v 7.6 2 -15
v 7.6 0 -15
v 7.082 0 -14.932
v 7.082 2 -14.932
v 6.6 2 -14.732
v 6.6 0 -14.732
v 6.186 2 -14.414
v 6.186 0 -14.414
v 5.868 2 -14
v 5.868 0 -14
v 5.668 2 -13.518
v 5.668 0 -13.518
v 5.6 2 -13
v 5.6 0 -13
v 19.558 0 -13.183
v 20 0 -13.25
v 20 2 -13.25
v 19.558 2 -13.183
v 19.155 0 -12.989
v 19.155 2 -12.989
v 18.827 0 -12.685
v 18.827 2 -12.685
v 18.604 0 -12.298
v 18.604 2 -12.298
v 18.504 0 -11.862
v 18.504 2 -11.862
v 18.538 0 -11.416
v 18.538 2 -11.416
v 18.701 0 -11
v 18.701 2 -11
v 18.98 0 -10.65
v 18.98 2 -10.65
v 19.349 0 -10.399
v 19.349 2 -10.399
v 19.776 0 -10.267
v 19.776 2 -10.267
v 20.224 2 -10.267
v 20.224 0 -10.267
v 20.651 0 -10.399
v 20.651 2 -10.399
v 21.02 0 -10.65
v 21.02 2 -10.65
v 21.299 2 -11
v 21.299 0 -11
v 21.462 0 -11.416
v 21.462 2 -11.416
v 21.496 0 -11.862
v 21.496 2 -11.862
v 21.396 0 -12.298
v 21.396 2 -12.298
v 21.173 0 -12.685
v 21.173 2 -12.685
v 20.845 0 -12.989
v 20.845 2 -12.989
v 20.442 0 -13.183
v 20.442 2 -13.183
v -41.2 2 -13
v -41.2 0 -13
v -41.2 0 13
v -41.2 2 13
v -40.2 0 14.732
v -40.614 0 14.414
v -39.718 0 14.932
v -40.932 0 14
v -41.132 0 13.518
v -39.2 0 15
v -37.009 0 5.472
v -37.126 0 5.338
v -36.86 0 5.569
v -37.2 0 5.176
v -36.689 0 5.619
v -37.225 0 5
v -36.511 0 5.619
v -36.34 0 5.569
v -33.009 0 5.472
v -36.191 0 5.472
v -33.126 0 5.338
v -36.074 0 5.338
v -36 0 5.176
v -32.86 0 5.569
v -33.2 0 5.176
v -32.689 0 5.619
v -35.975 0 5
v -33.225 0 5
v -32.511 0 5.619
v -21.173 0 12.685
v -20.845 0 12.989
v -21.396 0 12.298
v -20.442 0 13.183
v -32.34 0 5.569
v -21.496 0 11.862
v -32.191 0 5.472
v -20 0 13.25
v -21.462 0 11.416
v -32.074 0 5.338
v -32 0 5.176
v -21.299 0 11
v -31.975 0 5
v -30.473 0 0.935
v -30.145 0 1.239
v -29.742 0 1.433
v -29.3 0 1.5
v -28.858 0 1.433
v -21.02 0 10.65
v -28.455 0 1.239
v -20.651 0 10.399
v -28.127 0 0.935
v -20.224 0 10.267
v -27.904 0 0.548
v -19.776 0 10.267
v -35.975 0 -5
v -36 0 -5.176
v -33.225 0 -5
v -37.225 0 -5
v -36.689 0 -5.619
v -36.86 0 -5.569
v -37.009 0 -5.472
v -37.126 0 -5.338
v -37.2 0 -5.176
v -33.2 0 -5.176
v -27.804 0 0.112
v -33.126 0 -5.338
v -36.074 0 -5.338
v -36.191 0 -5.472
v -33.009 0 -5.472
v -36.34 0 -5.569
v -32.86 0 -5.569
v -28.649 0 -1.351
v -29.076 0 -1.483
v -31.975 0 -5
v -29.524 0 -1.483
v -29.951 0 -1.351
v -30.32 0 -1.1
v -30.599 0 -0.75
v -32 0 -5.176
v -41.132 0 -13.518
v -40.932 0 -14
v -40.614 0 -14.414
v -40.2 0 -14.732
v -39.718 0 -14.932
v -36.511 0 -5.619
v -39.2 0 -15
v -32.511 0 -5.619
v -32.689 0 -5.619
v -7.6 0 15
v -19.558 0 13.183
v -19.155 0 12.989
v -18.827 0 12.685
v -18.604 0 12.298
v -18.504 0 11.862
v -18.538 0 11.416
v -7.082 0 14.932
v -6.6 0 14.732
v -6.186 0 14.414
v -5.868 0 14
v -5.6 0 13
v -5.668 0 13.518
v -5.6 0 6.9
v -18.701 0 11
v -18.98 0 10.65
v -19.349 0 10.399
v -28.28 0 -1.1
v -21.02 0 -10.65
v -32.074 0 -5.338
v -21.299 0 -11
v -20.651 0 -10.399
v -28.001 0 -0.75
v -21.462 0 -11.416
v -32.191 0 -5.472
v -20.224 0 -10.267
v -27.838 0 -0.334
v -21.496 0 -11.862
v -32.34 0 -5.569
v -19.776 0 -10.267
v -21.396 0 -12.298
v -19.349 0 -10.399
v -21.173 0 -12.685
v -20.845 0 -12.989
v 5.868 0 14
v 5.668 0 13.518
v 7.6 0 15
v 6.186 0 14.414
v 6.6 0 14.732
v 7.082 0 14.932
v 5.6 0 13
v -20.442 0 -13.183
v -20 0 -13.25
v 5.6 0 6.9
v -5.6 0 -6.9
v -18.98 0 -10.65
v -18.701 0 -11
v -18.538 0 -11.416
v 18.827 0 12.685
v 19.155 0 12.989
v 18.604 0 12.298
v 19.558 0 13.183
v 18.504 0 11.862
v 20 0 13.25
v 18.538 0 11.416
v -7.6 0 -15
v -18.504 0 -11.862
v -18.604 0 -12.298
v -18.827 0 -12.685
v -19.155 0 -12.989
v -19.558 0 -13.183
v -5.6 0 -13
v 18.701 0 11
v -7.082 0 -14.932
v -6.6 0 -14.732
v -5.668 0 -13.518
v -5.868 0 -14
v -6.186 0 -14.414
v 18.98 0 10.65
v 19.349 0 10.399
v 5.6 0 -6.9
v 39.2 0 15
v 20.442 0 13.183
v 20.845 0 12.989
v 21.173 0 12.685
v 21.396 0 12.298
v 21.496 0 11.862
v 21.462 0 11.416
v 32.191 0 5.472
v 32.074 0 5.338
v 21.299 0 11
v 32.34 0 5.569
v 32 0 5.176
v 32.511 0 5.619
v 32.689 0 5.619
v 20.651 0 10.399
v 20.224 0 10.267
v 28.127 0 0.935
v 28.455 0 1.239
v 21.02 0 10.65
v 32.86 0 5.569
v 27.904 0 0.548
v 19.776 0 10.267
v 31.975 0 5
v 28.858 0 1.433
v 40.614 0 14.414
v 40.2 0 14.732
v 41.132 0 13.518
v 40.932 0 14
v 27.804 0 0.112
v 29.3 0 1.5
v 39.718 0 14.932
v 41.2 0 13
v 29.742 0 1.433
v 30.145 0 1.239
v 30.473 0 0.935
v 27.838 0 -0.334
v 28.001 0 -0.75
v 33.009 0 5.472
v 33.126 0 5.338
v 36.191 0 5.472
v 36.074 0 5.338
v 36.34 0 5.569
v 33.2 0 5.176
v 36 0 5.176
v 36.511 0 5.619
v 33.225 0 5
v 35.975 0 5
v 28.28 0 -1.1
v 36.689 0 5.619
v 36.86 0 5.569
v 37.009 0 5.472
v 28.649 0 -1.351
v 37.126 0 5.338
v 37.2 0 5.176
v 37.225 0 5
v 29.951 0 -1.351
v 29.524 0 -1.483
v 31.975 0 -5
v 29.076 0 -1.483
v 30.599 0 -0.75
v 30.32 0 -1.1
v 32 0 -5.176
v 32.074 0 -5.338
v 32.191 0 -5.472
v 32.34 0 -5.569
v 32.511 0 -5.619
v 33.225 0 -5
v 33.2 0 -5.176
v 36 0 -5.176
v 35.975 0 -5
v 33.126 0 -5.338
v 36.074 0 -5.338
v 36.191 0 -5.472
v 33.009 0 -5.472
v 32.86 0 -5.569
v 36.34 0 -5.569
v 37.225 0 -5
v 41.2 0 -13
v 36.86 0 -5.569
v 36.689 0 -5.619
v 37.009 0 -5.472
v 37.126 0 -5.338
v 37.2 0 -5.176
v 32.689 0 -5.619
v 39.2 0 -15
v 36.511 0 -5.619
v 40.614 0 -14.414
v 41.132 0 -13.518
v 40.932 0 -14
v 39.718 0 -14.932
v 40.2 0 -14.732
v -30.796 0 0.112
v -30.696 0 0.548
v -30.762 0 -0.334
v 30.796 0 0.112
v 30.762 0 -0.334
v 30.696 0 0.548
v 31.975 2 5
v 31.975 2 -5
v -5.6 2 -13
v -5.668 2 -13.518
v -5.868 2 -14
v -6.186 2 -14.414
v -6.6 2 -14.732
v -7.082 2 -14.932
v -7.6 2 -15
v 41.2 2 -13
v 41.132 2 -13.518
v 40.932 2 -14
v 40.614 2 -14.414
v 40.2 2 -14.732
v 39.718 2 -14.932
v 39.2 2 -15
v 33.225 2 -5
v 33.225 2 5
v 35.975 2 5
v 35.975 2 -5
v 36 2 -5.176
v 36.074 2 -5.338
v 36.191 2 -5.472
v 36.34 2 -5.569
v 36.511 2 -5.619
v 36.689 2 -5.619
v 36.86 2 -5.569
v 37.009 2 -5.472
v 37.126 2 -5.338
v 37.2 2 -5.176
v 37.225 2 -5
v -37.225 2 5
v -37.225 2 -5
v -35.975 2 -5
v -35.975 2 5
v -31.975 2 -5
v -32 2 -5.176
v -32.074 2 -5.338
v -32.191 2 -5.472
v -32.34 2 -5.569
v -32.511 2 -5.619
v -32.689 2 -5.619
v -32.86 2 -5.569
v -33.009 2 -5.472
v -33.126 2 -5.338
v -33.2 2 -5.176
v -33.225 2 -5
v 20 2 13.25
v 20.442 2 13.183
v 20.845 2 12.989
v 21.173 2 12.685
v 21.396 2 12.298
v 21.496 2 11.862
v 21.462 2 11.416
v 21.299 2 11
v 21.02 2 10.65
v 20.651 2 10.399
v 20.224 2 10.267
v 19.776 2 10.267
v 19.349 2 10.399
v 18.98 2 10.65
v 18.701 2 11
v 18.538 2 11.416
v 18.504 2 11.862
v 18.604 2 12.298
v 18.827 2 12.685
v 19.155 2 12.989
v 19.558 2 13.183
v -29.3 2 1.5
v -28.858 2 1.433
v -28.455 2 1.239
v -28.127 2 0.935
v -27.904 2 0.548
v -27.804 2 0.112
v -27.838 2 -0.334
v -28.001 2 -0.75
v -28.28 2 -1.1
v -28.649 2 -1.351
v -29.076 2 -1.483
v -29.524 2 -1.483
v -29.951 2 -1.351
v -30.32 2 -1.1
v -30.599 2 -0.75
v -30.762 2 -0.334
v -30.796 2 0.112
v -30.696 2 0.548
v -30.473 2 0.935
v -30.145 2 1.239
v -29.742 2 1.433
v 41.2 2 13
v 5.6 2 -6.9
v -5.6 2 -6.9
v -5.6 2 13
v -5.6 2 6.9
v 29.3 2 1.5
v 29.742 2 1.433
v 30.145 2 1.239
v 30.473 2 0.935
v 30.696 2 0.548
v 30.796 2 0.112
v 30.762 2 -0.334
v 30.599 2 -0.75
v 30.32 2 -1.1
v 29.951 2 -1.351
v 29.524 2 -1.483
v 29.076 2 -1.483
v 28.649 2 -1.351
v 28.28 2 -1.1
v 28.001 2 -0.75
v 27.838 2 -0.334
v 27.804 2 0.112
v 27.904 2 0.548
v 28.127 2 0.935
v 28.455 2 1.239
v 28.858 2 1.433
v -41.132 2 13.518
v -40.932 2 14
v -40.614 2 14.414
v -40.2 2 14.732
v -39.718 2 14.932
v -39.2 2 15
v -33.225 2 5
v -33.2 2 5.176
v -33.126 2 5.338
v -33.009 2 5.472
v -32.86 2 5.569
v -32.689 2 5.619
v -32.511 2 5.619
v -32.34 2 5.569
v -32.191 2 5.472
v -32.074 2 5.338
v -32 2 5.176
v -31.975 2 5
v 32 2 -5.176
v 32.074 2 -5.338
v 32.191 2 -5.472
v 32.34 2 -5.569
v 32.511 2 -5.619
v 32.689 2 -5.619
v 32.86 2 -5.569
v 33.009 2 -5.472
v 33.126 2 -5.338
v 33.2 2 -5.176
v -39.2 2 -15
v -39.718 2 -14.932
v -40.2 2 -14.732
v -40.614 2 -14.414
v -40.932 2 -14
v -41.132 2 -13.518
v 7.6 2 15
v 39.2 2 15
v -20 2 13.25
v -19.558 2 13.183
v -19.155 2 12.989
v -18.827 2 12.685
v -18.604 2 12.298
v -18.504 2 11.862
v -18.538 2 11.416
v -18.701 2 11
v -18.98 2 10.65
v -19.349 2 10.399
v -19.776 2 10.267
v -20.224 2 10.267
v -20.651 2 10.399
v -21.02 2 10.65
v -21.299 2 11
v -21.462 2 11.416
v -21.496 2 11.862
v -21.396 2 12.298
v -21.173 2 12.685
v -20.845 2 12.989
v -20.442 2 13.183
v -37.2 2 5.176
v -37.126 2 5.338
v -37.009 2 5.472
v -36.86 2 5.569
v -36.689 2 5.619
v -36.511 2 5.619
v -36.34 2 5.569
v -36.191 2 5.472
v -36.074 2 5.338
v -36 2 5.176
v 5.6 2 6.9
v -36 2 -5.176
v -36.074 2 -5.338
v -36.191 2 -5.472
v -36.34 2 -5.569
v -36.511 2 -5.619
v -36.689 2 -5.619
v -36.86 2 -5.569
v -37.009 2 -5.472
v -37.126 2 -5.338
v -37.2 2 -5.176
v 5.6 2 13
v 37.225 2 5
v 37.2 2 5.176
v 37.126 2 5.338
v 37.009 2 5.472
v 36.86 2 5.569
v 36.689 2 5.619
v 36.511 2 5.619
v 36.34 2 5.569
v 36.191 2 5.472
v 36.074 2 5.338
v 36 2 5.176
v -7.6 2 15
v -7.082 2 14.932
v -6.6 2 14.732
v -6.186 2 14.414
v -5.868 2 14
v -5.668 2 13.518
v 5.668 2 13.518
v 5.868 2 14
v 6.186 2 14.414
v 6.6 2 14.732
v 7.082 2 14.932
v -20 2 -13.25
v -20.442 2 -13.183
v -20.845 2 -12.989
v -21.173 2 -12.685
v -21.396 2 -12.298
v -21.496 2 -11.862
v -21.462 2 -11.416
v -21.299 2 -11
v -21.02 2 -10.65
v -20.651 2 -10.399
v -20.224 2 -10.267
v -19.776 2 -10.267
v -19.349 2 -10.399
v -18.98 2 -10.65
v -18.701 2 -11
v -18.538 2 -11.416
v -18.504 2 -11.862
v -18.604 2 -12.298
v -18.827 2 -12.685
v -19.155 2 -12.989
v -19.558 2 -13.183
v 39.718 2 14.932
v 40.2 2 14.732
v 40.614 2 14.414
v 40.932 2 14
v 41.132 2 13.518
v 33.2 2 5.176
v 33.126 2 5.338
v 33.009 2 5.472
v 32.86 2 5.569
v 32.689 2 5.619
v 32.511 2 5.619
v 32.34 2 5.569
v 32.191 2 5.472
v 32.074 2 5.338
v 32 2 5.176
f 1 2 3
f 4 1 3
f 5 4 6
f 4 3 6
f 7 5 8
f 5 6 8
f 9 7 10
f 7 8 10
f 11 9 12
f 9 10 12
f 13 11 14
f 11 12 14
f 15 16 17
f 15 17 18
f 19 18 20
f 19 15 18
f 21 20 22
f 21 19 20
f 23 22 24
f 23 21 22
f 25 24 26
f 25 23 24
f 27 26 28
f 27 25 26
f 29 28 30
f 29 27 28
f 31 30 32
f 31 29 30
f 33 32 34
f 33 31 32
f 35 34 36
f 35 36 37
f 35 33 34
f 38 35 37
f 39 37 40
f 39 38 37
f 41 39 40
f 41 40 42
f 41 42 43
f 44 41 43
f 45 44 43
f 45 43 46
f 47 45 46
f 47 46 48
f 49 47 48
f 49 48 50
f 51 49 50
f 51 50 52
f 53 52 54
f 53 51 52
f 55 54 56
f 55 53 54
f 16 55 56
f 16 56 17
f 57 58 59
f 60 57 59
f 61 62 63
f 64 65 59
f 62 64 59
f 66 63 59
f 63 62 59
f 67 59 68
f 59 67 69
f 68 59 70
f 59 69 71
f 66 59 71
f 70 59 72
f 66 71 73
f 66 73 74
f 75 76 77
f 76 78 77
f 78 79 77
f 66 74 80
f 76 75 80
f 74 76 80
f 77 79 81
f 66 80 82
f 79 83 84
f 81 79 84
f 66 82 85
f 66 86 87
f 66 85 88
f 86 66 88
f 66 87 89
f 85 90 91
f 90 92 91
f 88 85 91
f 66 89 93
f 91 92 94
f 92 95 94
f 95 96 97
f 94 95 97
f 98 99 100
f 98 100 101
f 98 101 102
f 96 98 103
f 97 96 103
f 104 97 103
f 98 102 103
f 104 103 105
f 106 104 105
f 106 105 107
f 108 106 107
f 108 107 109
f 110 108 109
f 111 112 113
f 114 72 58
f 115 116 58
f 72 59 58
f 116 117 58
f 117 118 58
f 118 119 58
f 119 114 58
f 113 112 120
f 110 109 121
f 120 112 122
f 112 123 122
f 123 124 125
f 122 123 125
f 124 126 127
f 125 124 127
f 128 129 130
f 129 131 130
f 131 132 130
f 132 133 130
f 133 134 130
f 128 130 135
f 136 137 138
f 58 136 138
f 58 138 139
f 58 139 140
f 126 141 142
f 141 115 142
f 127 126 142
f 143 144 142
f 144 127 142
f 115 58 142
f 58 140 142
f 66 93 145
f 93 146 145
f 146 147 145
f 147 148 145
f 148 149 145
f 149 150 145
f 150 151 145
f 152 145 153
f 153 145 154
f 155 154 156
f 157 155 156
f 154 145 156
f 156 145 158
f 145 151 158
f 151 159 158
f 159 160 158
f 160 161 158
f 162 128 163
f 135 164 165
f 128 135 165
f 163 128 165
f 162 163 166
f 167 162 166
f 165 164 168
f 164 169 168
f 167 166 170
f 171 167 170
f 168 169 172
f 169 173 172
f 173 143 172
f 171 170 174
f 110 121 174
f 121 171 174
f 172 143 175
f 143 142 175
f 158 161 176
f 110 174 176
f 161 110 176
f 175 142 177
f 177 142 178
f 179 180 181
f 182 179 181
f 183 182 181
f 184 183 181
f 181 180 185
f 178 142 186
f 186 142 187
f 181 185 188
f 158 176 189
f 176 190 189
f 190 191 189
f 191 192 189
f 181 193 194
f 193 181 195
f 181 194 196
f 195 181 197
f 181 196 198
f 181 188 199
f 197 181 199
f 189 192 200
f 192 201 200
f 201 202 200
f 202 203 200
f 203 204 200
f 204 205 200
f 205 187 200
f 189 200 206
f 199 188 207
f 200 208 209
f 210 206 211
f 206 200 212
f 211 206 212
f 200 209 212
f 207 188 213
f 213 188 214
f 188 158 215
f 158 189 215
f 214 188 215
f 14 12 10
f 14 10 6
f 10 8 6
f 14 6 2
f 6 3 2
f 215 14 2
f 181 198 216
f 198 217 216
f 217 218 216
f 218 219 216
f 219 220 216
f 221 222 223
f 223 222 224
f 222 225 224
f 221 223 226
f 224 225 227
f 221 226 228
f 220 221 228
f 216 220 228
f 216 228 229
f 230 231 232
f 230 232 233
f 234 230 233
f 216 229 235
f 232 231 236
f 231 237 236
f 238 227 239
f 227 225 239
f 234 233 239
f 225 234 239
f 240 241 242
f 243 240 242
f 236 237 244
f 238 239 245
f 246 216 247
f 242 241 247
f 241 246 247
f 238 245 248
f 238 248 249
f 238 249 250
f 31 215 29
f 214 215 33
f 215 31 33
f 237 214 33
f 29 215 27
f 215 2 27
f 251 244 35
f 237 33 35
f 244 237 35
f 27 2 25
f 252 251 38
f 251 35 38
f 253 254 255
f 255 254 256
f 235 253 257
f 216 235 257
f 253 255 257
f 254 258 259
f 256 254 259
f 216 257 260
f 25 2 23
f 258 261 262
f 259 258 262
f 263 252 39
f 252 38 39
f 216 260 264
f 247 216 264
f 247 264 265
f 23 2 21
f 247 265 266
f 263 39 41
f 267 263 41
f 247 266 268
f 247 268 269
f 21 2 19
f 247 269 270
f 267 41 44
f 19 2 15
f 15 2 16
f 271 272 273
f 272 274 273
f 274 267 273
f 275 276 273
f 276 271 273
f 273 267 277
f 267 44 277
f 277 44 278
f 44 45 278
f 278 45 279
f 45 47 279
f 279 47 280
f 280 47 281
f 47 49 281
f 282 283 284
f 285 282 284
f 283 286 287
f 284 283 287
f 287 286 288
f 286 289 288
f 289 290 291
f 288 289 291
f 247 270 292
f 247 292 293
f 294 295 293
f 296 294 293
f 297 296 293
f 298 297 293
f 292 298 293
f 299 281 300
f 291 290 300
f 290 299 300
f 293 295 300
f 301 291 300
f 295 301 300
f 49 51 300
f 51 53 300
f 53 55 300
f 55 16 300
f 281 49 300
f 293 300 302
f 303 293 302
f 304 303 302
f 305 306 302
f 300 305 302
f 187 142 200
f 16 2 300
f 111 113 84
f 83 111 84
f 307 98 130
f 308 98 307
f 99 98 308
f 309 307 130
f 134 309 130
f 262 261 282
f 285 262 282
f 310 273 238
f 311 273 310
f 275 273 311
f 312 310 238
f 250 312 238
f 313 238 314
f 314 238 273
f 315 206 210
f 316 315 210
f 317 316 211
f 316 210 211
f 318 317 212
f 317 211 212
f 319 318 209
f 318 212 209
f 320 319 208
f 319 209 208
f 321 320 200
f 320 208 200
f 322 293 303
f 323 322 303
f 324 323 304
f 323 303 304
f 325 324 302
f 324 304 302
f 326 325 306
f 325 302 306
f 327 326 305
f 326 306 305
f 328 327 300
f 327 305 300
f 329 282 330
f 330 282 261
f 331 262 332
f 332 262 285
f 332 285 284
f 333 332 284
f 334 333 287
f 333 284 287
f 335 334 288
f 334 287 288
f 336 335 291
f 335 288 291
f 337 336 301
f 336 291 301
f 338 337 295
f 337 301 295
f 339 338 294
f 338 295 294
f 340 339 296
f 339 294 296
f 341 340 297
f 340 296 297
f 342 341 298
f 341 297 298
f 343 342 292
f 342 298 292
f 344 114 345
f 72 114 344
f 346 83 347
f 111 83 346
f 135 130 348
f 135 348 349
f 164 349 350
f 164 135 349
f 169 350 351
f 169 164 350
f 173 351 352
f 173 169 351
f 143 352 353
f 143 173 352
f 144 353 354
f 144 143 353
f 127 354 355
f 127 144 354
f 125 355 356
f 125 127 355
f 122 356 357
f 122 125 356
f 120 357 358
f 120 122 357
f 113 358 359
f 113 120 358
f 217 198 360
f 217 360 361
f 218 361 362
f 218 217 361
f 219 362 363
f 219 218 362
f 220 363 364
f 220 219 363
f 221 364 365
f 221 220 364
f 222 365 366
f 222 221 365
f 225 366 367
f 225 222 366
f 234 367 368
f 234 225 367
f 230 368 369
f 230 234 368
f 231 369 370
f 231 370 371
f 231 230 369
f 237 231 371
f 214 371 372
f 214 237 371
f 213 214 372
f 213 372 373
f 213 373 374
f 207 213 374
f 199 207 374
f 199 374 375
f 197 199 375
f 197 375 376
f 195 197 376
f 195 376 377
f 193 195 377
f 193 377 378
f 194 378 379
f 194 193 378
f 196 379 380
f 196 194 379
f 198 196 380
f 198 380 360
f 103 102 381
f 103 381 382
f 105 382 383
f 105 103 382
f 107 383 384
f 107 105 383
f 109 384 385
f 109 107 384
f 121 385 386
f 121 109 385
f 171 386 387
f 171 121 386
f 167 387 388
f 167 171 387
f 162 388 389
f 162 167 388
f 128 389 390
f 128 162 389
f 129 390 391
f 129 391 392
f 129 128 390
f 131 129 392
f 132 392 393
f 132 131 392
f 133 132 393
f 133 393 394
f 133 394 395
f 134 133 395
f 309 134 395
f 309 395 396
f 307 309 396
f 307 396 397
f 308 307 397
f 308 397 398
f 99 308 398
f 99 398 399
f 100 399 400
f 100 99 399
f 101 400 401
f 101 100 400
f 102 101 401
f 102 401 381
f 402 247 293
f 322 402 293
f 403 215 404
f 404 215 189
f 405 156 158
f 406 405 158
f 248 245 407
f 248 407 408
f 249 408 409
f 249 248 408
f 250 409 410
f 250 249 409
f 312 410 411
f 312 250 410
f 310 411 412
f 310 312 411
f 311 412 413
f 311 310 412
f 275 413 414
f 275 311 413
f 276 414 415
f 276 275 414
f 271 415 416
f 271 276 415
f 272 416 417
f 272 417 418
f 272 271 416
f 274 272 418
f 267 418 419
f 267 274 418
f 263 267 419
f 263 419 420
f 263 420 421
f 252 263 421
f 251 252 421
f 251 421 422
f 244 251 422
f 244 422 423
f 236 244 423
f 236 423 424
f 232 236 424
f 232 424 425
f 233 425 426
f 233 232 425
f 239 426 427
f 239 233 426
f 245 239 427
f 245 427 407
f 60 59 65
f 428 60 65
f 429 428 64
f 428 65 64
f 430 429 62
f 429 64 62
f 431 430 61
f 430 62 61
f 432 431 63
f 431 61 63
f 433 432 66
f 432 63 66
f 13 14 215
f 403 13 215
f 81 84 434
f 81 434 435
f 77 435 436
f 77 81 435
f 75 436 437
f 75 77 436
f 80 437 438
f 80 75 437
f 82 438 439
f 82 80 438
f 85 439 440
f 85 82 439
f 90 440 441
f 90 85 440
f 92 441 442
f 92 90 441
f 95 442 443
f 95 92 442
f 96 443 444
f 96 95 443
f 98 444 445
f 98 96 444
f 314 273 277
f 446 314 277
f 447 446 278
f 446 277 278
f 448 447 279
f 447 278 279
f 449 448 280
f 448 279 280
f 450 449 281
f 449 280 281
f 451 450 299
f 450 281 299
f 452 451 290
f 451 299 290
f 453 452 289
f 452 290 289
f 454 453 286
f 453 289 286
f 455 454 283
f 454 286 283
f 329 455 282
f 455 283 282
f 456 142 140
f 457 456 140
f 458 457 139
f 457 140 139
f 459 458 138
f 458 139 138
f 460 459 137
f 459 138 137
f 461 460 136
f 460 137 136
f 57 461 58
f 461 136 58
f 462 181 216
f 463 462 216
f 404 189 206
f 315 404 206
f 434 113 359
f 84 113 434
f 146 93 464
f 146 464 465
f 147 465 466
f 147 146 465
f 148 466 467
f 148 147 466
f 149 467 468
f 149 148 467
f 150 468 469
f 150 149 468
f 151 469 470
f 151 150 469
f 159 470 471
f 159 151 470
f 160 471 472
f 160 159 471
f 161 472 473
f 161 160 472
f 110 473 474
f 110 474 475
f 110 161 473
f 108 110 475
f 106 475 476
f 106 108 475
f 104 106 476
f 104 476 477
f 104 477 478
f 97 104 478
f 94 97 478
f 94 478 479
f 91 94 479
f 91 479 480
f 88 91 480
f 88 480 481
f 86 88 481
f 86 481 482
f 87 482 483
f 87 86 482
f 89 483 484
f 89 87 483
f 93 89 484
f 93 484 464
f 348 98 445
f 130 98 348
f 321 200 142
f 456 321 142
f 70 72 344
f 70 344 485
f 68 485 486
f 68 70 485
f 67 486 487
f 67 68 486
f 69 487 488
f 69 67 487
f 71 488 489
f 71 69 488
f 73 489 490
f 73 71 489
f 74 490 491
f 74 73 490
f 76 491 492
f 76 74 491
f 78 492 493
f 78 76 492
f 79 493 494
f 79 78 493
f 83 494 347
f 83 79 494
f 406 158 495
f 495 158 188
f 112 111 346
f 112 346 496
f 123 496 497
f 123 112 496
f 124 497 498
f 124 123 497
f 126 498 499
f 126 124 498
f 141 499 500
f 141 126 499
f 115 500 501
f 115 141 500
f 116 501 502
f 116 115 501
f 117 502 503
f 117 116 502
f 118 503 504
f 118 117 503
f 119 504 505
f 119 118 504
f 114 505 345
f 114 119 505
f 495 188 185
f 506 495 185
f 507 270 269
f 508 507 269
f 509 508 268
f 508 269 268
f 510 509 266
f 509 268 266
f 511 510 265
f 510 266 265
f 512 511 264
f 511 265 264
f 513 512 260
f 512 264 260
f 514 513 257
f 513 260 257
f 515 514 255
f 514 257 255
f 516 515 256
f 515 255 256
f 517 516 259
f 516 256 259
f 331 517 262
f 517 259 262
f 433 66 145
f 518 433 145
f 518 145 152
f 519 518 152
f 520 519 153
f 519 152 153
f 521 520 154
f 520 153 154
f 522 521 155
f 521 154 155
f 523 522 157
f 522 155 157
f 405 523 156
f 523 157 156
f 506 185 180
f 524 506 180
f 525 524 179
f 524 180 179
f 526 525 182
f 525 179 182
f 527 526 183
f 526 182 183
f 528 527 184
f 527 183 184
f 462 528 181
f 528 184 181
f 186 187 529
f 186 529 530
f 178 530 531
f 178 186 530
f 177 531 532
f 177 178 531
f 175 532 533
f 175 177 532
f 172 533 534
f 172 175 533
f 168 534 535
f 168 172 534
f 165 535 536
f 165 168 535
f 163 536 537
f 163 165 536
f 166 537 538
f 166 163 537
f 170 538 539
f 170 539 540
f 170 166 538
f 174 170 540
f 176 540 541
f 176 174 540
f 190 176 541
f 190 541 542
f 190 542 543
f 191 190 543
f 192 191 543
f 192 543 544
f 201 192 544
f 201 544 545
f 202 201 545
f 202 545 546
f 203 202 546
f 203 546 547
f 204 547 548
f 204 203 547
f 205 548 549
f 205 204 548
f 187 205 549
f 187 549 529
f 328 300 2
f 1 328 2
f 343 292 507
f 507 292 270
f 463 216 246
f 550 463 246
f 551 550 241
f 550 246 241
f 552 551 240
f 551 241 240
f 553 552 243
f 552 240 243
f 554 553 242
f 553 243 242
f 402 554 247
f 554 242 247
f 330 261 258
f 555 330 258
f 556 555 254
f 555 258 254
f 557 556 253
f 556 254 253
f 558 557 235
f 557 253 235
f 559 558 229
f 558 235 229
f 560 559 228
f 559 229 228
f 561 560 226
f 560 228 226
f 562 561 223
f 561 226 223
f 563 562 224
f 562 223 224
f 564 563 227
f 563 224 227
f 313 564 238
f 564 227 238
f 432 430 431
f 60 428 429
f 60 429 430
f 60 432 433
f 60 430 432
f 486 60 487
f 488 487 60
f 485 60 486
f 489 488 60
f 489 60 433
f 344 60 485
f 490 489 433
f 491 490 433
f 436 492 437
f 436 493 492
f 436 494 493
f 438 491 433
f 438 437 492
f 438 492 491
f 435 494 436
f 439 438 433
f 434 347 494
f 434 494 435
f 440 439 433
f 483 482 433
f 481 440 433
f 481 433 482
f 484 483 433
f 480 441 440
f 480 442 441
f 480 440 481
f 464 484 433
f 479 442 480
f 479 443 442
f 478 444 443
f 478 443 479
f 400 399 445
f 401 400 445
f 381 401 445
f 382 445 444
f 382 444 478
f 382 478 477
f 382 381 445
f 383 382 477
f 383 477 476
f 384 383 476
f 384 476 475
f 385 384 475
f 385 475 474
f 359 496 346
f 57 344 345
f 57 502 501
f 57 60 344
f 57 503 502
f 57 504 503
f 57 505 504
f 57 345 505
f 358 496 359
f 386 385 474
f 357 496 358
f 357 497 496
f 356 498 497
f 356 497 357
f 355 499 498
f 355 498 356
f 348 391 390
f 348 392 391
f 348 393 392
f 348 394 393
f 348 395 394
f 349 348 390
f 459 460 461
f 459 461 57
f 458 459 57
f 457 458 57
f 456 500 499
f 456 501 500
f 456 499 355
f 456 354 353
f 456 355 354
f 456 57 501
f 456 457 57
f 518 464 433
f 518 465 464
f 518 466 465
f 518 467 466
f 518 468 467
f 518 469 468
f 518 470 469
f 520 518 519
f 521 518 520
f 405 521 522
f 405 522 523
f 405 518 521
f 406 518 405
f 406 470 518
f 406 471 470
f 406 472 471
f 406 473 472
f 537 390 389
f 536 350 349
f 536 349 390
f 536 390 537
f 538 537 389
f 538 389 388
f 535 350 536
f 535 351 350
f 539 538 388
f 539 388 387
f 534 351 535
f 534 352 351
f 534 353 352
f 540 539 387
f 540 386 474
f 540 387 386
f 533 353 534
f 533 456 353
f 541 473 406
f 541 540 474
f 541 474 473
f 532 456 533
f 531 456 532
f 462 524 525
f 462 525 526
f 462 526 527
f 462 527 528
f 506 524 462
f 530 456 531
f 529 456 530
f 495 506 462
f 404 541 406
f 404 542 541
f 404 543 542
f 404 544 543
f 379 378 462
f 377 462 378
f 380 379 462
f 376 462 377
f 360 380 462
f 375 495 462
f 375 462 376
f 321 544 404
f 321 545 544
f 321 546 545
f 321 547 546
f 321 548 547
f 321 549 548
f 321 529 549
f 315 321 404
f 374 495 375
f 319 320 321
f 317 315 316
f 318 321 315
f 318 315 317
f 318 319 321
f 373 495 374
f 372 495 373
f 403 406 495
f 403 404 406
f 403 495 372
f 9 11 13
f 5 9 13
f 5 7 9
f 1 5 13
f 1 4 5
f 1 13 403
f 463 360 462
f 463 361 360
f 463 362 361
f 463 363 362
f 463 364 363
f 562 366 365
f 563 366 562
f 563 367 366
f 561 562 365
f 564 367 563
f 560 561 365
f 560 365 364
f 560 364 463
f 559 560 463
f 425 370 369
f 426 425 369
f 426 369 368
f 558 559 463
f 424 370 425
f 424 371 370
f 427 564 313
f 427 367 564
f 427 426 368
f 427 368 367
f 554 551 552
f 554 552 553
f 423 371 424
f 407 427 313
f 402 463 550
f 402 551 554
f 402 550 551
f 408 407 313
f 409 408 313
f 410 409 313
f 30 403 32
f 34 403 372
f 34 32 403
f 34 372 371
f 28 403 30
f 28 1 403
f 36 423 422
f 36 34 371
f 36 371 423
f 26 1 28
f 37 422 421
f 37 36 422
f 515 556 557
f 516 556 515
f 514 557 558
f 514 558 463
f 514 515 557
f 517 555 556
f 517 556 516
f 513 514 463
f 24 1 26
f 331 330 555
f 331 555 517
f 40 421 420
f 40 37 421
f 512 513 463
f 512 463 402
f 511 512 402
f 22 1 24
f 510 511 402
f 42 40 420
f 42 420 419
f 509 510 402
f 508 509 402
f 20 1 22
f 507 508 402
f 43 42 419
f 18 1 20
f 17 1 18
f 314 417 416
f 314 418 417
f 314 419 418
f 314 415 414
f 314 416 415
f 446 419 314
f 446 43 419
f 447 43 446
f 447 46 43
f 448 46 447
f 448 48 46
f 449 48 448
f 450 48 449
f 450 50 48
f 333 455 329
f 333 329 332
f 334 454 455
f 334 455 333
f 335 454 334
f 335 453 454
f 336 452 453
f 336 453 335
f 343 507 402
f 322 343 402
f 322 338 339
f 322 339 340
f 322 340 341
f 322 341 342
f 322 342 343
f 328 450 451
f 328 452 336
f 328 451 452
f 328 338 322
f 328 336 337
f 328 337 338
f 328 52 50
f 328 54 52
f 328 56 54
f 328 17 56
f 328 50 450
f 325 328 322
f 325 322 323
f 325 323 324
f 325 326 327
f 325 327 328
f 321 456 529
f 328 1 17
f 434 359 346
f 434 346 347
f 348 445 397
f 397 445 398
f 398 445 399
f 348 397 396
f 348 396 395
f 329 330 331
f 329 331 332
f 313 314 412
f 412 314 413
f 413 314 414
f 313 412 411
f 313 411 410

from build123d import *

# Parameters (mm, degrees)
SKETCH_1_R      = 1.5
EXTRUDE_1_DEPTH = 2


with BuildPart() as part:
    # 草图1 → 凸台-拉伸1 (new body)
    with BuildSketch(Plane(origin=(0, 0, 0), x_dir=(1, 0, 0), z_dir=(0, 1, 0))):
        with BuildLine():
            Line((-5.6, 6.9), (-5.6, 13))
            ThreePointArc((-5.6, 13), (-6.185786438, 14.414213562), (-7.6, 15))
            Line((-7.6, 15), (-39.2, 15))
            ThreePointArc((-39.2, 15), (-40.614213562, 14.414213562), (-41.2, 13))
            Line((-41.2, 13), (-41.2, -13))
            ThreePointArc((-41.2, -13), (-40.614213562, -14.414213562), (-39.2, -15))
            Line((-39.2, -15), (-7.6, -15))
            ThreePointArc((-7.6, -15), (-6.185786438, -14.414213562), (-5.6, -13))
            Line((-5.6, -13), (-5.6, -6.9))
            Line((-5.6, -6.9), (5.6, -6.9))
            Line((5.6, -6.9), (5.6, -13))
            ThreePointArc((5.6, -13), (6.185786438, -14.414213562), (7.6, -15))
            Line((7.6, -15), (39.2, -15))
            ThreePointArc((39.2, -15), (40.614213562, -14.414213562), (41.2, -13))
            Line((41.2, -13), (41.2, 13))
            ThreePointArc((41.2, 13), (40.614213562, 14.414213562), (39.2, 15))
            Line((39.2, 15), (7.6, 15))
            ThreePointArc((7.6, 15), (6.185786438, 14.414213562), (5.6, 13))
            Line((5.6, 13), (5.6, 6.9))
            Line((5.6, 6.9), (-5.6, 6.9))
        make_face()
        with Locations(Location((-20, -11.75, 0), (0, 0, 270))):
            Circle(SKETCH_1_R, mode=Mode.SUBTRACT)
        with Locations(Location((20, -11.75, 0), (0, 0, 270))):
            Circle(SKETCH_1_R, mode=Mode.SUBTRACT)
        with Locations(Location((20, 11.75, 0), (0, 0, 90))):
            Circle(SKETCH_1_R, mode=Mode.SUBTRACT)
        with Locations(Location((-20, 11.75, 0), (0, 0, 90))):
            Circle(SKETCH_1_R, mode=Mode.SUBTRACT)
        with Locations(Location((-29.3, 0, 0), (0, 0, 270))):
            Circle(SKETCH_1_R, mode=Mode.SUBTRACT)
        with Locations(Location((29.3, 0, 0), (0, 0, 270))):
            Circle(SKETCH_1_R, mode=Mode.SUBTRACT)
        with BuildLine():
            Line((33.225, 5), (33.225, -5))
            ThreePointArc((33.225, -5), (32.6, -5.625), (31.975, -5))
            Line((31.975, -5), (31.975, 5))
            ThreePointArc((31.975, 5), (32.6, 5.625), (33.225, 5))
        make_face(mode=Mode.SUBTRACT)
        with BuildLine():
            Line((37.225, 5), (37.225, -5))
            ThreePointArc((37.225, -5), (36.6, -5.625), (35.975, -5))
            Line((35.975, -5), (35.975, 5))
            ThreePointArc((35.975, 5), (36.6, 5.625), (37.225, 5))
        make_face(mode=Mode.SUBTRACT)
        with BuildLine():
            Line((-37.225, 5), (-37.225, -5))
            ThreePointArc((-37.225, -5), (-36.6, -5.625), (-35.975, -5))
            Line((-35.975, -5), (-35.975, 5))
            ThreePointArc((-35.975, 5), (-36.6, 5.625), (-37.225, 5))
        make_face(mode=Mode.SUBTRACT)
        with BuildLine():
            Line((-33.225, 5), (-33.225, -5))
            ThreePointArc((-33.225, -5), (-32.6, -5.625), (-31.975, -5))
            Line((-31.975, -5), (-31.975, 5))
            ThreePointArc((-31.975, 5), (-32.6, 5.625), (-33.225, 5))
        make_face(mode=Mode.SUBTRACT)
    extrude(amount=EXTRUDE_1_DEPTH)


solid = part.part
